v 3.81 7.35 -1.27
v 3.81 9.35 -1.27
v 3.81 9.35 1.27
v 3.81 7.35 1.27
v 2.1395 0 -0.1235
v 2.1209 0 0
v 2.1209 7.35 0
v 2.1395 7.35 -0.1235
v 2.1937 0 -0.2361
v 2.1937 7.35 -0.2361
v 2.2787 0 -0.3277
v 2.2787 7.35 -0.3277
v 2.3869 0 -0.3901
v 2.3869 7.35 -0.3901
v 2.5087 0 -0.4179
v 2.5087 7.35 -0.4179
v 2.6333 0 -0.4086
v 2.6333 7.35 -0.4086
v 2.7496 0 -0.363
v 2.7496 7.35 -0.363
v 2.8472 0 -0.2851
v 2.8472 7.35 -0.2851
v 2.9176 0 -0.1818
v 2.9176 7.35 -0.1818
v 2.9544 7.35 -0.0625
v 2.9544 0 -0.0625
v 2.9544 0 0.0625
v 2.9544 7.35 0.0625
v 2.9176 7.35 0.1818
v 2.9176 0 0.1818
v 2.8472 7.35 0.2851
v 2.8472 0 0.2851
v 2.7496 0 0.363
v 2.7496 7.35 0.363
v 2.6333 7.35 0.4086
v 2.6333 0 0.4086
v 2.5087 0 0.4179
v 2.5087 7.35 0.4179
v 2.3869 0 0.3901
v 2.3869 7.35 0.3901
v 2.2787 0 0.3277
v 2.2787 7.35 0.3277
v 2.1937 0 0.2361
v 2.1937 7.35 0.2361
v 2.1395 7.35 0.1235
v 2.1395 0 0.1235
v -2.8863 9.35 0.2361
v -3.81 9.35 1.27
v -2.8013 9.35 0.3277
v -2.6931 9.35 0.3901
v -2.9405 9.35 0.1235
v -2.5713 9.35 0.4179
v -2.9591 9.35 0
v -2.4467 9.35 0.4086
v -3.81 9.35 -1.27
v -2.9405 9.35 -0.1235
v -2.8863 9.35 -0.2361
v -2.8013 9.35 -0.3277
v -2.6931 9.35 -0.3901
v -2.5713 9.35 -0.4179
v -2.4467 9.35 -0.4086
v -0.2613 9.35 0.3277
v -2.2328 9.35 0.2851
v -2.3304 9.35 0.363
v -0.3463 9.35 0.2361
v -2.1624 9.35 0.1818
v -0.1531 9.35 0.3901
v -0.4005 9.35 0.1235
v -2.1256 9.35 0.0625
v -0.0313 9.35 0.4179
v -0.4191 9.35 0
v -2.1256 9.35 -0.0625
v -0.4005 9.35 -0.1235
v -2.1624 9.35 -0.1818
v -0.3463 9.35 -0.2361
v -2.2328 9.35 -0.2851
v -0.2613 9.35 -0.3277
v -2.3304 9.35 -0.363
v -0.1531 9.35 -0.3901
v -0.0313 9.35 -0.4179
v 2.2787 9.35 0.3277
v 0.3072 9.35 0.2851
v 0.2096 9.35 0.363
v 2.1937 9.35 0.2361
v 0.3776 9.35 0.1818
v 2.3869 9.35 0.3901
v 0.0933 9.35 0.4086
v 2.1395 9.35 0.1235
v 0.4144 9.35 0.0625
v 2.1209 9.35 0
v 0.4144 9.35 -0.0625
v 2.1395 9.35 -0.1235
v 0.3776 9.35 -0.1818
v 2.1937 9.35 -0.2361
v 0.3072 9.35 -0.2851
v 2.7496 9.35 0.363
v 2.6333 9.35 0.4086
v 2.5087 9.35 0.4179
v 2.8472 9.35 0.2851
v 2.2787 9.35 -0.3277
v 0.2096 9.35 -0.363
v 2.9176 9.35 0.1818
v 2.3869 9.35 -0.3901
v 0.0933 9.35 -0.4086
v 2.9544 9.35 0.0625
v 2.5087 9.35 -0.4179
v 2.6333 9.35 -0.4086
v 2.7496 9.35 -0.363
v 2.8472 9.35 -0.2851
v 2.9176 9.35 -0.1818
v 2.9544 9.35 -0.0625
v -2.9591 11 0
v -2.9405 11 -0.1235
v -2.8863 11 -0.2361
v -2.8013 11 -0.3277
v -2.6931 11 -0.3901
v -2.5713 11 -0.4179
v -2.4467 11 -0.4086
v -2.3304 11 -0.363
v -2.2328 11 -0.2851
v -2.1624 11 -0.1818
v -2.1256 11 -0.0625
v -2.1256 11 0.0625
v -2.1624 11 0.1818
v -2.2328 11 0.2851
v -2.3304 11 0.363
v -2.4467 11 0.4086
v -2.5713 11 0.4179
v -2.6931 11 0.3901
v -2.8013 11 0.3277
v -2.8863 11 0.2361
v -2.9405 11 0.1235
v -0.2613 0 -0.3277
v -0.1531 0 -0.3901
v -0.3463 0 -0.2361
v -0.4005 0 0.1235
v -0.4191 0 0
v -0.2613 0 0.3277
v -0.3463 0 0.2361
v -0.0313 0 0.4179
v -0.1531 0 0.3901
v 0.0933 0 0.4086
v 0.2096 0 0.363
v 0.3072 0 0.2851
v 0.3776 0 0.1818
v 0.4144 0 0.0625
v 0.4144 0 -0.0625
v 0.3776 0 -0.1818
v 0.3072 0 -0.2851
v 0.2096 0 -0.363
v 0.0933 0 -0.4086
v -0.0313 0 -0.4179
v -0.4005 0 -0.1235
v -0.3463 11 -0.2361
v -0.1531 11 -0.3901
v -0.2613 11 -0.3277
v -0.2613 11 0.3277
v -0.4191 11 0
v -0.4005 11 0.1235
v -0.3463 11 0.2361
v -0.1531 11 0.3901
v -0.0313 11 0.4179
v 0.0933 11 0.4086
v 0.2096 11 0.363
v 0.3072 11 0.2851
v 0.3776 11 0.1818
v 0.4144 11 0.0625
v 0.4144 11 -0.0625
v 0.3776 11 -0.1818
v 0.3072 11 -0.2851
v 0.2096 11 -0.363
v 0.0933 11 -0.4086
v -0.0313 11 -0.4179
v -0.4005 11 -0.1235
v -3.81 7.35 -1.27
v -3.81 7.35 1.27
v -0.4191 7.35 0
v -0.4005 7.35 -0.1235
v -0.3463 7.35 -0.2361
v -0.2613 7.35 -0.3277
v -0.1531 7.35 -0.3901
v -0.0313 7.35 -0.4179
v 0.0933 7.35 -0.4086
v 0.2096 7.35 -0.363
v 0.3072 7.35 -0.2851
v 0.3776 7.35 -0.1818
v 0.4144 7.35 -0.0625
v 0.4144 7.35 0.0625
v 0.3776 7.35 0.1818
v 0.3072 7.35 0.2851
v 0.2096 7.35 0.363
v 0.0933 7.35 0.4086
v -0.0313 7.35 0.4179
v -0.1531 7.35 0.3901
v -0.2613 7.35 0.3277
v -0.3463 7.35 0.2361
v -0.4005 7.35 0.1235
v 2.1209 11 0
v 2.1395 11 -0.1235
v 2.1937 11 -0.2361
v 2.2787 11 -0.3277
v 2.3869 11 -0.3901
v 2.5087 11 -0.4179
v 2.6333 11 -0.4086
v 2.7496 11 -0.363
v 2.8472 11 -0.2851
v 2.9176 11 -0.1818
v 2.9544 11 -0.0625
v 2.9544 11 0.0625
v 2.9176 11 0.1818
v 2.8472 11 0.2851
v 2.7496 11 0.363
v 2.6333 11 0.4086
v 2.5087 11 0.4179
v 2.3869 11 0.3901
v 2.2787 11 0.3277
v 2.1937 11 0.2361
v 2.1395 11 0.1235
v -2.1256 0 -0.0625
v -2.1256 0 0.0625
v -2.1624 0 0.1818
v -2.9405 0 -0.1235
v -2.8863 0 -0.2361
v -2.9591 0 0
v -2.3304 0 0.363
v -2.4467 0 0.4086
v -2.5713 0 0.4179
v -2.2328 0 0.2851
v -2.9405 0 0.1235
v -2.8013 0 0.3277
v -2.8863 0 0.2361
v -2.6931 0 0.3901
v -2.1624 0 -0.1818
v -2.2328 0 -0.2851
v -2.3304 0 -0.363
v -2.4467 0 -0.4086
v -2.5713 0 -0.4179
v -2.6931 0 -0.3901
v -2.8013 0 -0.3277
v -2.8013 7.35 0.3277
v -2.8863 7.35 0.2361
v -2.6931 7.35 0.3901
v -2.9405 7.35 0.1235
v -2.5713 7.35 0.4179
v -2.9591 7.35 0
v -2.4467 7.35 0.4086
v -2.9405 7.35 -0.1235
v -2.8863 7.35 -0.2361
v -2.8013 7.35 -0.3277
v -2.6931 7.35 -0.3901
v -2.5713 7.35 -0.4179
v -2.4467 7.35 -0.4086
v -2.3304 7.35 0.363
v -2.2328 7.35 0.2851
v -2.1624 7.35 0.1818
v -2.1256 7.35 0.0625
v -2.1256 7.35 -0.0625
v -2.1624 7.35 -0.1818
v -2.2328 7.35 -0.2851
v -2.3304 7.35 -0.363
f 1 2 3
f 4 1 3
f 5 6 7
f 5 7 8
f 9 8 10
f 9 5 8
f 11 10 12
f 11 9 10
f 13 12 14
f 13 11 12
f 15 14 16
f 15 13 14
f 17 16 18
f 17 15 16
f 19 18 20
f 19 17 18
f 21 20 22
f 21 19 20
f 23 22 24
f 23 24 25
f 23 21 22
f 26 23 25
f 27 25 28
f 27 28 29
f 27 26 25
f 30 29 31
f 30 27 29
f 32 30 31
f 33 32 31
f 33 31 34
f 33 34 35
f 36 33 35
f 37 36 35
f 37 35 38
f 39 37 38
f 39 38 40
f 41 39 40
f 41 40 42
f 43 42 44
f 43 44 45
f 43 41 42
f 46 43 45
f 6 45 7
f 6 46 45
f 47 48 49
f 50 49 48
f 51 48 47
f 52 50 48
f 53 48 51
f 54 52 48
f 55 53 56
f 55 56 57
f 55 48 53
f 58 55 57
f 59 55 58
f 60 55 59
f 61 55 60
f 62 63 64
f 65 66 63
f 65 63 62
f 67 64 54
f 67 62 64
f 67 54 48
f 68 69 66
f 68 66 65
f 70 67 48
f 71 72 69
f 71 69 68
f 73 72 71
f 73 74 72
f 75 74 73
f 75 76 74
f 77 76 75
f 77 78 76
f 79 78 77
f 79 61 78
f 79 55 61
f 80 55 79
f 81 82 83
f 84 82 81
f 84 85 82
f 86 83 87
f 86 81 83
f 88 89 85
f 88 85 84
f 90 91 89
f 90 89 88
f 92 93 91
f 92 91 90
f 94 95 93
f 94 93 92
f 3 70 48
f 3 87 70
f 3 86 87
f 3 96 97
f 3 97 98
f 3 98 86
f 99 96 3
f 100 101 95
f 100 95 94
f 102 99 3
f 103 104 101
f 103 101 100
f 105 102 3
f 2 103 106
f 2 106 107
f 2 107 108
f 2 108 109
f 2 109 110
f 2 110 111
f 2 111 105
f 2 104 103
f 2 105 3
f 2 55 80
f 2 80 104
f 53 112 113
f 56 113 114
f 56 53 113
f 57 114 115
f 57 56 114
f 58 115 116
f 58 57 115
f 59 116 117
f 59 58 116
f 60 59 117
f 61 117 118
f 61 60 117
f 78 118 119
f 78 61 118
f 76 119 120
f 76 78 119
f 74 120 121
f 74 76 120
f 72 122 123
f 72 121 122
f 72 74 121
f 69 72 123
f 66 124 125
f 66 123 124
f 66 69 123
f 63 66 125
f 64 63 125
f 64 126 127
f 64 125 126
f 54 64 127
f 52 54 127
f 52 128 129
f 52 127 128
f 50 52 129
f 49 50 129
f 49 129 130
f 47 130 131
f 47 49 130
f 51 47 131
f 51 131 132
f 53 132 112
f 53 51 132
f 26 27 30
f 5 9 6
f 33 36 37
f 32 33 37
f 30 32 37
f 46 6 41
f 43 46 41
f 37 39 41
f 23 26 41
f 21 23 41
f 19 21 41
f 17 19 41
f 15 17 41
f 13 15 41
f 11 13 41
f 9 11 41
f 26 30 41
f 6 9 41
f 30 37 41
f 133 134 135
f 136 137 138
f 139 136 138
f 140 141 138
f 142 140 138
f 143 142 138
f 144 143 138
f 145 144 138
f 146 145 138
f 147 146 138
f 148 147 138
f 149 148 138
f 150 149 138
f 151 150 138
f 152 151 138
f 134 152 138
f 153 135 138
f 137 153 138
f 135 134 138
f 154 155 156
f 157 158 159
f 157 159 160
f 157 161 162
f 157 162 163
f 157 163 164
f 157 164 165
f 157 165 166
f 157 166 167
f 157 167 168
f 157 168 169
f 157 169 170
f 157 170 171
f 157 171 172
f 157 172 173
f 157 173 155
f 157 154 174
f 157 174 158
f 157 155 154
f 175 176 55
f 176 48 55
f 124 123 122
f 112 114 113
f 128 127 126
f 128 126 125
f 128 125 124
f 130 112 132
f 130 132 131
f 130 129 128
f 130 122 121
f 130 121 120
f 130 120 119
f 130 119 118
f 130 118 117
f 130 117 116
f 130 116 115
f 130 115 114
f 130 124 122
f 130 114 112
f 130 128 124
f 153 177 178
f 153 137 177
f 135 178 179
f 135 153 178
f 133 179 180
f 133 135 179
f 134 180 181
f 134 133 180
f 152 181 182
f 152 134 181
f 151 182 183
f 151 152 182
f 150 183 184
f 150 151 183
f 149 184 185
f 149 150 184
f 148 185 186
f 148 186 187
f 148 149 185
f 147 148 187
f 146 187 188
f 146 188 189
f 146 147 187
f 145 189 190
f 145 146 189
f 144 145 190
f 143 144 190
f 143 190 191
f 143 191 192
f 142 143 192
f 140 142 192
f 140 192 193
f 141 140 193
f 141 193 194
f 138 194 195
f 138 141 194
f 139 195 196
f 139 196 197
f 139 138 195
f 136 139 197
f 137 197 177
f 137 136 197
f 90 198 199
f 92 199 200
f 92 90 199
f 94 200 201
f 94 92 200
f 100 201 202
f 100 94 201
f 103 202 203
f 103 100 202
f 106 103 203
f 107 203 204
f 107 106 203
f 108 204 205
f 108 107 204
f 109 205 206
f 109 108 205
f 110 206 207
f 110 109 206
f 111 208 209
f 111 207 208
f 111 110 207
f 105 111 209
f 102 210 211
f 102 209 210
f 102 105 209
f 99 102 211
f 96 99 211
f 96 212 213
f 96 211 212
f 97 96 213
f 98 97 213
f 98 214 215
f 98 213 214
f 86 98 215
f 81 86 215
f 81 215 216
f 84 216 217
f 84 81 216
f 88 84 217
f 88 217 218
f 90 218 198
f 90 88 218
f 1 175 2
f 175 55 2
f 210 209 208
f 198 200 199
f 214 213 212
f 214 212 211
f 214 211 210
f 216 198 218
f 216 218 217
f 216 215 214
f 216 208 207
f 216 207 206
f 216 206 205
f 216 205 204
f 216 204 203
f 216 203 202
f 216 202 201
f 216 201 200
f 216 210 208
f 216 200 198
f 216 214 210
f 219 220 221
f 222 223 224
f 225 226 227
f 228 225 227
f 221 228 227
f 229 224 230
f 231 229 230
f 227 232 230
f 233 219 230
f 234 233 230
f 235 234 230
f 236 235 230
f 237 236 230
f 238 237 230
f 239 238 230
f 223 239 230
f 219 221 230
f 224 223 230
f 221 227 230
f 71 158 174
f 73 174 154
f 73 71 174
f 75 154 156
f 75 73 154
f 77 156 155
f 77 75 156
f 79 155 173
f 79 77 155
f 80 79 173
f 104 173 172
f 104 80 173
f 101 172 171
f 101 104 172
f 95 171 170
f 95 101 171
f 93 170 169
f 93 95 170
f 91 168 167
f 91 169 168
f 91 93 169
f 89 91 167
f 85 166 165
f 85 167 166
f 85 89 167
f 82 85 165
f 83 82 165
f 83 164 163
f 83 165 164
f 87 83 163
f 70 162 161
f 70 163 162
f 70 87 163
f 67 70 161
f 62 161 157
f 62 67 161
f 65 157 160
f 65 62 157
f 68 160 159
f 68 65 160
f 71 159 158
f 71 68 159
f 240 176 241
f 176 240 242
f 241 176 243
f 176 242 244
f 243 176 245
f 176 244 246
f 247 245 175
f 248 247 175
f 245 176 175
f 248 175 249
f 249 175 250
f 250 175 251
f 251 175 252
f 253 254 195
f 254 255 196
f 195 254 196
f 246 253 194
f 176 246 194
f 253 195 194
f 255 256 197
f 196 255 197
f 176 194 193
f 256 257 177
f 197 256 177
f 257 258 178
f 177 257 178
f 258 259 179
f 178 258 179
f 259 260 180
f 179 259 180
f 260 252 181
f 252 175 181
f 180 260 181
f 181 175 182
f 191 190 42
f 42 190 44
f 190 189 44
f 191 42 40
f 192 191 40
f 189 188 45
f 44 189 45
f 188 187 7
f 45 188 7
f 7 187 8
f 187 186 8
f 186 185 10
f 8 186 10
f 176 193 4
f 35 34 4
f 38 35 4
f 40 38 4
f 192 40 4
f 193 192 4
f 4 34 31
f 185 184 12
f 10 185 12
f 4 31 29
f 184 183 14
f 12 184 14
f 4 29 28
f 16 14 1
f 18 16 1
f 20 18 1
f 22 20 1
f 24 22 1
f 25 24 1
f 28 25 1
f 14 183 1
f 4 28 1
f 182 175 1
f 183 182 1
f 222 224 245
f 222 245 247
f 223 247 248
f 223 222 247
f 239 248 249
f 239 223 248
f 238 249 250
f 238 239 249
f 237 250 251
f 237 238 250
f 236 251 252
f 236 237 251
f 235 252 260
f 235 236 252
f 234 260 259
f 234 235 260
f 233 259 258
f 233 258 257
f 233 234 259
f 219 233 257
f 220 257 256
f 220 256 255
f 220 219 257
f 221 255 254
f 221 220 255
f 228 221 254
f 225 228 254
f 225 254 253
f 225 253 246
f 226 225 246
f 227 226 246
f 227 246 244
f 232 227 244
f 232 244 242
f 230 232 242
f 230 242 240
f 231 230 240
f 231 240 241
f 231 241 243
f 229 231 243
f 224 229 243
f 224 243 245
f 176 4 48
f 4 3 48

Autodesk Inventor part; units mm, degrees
ref_plane "YZ Plane" through (0, 0, 0) normal (1, 0, 0) x (0, 1, 0)
ref_plane "XZ Plane" through (0, 0, 0) normal (0, 1, 0) x (-1, 0, 0)
sketch "Sketch1" plane through (0, 0, 0) normal (0, 1, 0) x (-1, 0, 0)
  circle A0 centre (0, 0) radius 0.4191
  circle A1 centre (2.54, 0) radius 0.4191
  circle A2 centre (-2.54, 0) radius 0.4191
  dimension "d0" = 0.8382
  dimension "d1" = 0.8382
  dimension "d2" = 0.8382
  dimension "d3" = 2.54
  dimension "d4" = 2.54
extrude "Extrusion1" add sketch "Sketch1" along normal blind 11
ref_plane "Work Plane1" through (2.54, 9.35, 0) normal (0, 1, 0) x (1, 0, 0)
sketch "Sketch2" plane through (2.54, 9.35, 0) normal (0, 1, 0) x (1, 0, 0)
  line L0 (-6.35, 1.27) -> (1.27, 1.27)
  line L1 (1.27, 1.27) -> (1.27, -1.27)
  line L2 (1.27, -1.27) -> (-6.35, -1.27)
  line L3 (-6.35, -1.27) -> (-6.35, 1.27)
  point P0 (-2.54, 0)
  dimension "d8" = 3.81
  dimension "d9" = 3.81
  dimension "d10" = 1.27
  dimension "d11" = 2.54
extrude "Extrusion2" add sketch "Sketch2" against normal blind 2
properties part number "3PinHeader"
